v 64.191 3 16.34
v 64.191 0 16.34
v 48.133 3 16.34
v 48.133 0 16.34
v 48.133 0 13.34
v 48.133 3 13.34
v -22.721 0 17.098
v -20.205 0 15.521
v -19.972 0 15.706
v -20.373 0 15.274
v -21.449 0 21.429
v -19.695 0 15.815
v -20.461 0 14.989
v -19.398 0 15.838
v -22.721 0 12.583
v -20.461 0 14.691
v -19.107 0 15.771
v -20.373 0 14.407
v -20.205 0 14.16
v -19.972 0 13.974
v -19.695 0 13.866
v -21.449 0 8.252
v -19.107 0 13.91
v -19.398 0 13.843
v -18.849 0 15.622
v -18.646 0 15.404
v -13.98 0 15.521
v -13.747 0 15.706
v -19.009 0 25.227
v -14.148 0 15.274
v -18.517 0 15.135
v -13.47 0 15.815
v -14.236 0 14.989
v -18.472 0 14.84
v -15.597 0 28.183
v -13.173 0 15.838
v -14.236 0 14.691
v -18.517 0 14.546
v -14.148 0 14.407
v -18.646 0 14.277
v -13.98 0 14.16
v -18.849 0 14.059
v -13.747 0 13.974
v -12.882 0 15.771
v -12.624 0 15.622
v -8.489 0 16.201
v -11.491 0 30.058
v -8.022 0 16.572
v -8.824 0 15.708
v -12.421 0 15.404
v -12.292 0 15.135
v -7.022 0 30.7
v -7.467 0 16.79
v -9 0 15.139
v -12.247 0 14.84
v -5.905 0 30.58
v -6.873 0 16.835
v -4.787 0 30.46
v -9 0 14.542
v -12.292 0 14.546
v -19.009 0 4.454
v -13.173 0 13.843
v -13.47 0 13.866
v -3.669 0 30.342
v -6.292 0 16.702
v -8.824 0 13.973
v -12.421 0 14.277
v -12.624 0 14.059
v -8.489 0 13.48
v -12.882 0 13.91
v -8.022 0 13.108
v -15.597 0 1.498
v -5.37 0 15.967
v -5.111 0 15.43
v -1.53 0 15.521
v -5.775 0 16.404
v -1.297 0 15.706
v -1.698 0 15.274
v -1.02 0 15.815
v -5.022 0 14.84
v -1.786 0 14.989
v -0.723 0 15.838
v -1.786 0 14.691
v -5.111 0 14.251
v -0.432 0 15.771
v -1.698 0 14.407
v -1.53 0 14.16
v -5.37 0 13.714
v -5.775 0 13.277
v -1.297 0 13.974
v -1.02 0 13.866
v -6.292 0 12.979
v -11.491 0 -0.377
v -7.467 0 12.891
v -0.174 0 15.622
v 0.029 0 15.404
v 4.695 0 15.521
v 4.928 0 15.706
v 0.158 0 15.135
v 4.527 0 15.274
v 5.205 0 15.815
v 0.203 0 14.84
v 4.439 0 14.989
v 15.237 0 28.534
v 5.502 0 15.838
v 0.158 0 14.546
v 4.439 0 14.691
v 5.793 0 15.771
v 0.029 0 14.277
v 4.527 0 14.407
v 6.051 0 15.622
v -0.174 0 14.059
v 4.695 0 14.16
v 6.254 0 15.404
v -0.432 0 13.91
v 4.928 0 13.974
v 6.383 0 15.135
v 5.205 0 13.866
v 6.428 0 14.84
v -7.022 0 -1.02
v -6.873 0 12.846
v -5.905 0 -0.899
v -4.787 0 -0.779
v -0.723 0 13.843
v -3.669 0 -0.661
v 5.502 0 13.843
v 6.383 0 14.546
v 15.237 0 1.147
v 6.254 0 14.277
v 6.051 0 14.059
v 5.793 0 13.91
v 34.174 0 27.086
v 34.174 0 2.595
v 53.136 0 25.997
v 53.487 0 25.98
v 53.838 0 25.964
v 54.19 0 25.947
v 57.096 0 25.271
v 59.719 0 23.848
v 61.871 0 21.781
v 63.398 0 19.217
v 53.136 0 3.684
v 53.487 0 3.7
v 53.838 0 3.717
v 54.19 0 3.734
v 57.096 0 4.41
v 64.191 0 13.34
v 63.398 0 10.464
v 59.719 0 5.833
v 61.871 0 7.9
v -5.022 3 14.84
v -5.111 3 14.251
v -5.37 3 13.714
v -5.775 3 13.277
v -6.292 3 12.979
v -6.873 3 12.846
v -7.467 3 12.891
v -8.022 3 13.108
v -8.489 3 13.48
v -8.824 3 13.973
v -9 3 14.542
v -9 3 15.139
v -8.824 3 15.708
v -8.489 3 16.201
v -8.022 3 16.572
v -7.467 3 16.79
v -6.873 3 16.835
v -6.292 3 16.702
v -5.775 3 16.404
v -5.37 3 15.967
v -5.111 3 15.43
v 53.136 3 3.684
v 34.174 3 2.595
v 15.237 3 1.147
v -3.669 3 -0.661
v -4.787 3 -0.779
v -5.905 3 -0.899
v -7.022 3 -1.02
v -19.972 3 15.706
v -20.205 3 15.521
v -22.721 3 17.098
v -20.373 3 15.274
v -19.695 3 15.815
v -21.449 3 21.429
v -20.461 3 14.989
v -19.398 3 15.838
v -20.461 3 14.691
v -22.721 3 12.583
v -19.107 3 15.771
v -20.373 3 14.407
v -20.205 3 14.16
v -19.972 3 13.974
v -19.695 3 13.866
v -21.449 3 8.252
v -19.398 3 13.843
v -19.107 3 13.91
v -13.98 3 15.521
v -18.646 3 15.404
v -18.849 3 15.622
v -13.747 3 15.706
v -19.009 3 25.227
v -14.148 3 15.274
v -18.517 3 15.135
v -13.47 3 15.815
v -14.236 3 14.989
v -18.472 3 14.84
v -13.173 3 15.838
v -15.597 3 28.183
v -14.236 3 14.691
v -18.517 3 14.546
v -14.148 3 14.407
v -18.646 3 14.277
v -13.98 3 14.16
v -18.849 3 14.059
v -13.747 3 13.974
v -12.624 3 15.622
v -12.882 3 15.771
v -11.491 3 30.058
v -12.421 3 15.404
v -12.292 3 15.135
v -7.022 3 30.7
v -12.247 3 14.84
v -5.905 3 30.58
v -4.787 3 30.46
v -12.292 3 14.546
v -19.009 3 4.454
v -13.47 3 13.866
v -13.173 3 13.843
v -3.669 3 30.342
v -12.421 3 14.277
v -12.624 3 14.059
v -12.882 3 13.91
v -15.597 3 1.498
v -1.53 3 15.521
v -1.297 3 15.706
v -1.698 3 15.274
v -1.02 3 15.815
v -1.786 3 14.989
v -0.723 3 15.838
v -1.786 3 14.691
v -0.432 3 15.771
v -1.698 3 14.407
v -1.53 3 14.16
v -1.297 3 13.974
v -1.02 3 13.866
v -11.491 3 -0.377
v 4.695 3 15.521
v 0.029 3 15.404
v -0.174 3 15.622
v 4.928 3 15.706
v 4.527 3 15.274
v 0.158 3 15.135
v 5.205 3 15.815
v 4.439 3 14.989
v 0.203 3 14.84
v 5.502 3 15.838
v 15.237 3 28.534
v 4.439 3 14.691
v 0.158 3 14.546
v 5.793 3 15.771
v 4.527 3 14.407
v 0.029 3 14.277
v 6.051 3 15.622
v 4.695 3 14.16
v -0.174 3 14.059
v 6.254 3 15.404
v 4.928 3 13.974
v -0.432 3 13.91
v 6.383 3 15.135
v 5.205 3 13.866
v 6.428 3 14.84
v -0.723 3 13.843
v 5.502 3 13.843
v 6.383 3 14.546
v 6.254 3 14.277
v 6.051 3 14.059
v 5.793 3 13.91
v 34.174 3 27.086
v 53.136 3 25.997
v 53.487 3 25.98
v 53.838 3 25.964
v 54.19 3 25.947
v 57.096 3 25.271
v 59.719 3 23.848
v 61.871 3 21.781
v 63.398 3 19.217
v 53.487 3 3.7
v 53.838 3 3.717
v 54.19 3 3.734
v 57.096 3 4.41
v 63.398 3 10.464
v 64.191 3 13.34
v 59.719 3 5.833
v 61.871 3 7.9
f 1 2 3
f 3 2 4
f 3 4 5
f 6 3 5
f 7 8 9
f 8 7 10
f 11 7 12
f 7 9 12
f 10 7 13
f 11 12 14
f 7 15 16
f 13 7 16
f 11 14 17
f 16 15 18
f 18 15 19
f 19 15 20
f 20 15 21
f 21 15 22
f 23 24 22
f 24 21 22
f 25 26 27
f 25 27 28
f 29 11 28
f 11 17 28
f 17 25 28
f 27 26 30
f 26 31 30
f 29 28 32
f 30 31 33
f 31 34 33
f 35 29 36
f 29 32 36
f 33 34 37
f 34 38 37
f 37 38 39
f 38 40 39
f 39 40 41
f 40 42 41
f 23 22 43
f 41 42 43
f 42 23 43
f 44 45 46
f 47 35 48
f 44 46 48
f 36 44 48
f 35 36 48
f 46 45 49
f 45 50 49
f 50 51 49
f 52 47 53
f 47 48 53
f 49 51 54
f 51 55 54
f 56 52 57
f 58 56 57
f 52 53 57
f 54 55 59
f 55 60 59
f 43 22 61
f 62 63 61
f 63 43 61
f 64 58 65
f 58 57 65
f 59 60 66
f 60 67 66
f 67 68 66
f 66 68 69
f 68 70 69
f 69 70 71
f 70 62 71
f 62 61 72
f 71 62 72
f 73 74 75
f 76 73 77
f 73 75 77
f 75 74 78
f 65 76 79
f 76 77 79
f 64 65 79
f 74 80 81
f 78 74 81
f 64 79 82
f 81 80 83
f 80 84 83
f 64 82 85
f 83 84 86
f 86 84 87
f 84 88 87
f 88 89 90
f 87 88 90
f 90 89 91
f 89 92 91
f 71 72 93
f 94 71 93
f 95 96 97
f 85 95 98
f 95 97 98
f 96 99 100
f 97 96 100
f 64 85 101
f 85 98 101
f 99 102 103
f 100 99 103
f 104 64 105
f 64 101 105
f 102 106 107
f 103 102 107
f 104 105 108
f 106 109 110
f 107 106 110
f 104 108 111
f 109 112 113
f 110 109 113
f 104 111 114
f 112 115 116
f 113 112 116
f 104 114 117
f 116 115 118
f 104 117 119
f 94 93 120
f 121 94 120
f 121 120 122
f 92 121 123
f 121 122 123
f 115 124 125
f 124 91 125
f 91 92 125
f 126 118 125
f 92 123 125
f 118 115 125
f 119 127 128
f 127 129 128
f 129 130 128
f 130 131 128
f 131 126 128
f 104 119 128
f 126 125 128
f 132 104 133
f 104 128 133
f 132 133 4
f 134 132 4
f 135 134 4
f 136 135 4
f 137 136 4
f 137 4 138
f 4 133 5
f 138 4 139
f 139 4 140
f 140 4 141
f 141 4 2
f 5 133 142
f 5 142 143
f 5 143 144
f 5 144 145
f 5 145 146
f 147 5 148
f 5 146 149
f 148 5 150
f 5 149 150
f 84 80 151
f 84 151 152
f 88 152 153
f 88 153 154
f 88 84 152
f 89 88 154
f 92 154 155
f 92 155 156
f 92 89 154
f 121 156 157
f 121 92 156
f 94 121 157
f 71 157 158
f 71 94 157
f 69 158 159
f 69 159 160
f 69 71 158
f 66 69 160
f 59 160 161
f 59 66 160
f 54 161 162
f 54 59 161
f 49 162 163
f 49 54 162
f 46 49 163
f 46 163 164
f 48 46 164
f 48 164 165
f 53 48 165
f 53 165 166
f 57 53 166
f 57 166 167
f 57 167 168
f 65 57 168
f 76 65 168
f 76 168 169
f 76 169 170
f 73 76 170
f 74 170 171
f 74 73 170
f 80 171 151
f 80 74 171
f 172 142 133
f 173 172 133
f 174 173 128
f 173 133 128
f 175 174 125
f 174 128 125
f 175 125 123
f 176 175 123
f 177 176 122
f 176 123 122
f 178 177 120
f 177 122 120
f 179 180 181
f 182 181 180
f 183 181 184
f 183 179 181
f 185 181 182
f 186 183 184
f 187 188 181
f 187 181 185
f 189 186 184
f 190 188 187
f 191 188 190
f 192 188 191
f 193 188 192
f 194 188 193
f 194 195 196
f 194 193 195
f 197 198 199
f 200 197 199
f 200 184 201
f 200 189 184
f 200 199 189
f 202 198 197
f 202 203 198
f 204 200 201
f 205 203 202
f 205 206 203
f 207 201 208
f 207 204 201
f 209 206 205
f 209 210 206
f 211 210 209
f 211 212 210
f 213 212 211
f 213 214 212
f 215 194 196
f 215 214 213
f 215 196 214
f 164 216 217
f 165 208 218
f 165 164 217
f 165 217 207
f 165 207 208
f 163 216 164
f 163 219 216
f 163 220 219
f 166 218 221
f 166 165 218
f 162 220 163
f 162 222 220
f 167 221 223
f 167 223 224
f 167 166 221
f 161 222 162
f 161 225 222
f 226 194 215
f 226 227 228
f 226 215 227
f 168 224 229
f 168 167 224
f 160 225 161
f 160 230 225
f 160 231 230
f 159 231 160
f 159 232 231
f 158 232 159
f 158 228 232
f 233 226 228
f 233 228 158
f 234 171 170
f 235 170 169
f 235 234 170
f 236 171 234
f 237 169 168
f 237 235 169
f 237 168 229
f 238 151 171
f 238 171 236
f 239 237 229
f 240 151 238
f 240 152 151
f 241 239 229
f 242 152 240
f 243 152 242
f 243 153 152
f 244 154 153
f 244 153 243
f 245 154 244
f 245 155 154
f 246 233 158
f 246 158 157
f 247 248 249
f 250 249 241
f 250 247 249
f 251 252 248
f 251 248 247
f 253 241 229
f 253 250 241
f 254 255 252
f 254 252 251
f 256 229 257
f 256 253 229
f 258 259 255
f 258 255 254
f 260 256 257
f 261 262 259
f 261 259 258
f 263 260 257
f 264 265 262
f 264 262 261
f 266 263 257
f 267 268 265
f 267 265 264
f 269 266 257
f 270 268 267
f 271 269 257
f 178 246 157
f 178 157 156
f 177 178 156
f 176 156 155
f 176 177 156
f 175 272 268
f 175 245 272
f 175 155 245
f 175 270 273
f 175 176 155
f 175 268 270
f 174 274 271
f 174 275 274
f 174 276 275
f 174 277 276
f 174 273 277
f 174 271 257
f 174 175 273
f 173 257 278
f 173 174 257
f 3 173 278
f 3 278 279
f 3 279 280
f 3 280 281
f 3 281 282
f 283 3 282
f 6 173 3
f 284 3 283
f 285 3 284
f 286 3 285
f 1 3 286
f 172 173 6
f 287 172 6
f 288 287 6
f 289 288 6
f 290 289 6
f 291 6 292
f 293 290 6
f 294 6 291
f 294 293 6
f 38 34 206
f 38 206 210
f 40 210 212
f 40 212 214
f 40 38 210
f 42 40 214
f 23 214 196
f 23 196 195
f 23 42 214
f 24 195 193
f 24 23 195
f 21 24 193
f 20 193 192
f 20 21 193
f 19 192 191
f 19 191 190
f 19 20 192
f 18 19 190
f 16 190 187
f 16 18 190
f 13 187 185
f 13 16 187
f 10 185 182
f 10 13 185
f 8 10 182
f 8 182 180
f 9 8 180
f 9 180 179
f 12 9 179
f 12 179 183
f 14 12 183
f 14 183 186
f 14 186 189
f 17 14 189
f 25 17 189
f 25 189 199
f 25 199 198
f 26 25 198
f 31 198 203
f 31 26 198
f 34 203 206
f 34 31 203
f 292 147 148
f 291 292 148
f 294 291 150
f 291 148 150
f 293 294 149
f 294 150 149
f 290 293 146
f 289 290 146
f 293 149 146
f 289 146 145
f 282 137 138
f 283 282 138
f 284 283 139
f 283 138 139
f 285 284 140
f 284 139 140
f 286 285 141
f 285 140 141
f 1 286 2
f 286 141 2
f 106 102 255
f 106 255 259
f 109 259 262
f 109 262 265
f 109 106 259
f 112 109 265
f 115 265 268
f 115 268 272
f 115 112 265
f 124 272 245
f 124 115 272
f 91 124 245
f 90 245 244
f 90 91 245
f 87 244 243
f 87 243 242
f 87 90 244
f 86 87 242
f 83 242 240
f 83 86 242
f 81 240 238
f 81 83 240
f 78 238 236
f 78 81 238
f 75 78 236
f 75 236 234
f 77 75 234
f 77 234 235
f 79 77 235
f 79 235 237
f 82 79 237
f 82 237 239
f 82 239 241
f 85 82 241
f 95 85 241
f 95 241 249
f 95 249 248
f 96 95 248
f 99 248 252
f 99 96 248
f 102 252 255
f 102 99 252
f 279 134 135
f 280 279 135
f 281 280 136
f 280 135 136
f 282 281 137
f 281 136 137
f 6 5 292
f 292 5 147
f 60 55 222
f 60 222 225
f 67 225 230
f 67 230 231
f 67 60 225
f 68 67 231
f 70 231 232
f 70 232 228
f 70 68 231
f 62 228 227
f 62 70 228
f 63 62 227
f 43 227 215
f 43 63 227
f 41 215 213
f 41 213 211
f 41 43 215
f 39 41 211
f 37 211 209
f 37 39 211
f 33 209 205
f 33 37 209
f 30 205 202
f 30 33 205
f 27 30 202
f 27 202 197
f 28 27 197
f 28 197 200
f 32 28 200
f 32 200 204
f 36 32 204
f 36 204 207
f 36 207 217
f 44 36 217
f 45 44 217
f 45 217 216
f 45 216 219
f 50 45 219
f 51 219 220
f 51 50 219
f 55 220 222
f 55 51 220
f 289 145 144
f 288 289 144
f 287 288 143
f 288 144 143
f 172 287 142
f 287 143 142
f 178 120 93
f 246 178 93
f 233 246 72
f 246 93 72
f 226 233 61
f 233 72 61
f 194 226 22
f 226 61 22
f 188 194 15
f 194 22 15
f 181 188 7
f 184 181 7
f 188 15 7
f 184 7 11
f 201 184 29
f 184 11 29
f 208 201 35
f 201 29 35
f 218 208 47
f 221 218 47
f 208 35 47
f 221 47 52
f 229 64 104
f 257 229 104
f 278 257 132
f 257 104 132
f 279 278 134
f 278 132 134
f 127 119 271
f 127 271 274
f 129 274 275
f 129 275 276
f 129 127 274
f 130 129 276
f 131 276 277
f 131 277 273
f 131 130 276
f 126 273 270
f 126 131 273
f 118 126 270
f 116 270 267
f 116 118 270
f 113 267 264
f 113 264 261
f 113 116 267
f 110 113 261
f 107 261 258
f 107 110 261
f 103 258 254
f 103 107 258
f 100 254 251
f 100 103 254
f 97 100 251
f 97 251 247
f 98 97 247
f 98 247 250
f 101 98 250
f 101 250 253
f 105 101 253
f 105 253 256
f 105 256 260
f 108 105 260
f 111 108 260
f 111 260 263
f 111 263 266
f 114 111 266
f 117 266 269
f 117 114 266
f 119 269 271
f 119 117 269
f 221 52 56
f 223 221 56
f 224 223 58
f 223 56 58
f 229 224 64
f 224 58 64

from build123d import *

# Parameters (mm, degrees)
SKETCH1_R           = 1
SKETCH1_R_2         = 2
BOSS_EXTRUDE1_DEPTH = 3


with BuildPart() as part:
    # Sketch1 → Boss-Extrude1 (new body)
    with BuildSketch(Plane(origin=(0, 0, 0), x_dir=(1, 0, 0), z_dir=(0, 1, 0))):
        with BuildLine():
            Line((64.190973866, -16.340444348), (48.133067619, -16.340444348))
            Line((48.133067619, -16.340444348), (48.133067619, -13.340444349))
            Line((48.133067619, -13.340444349), (64.190973866, -13.340444349))
            ThreePointArc((64.190973866, -13.340444349), (60.864318365, -6.794408764), (54.189826358, -3.733628612))
            ThreePointArc((54.189826358, -3.733628612), (53.662670154, -3.708804342), (53.135527124, -3.683701873))
            ThreePointArc((53.135527124, -3.683701873), (24.702146142, -1.915932839), (-3.669341235, 0.661054823))
            ThreePointArc((-3.669341235, 0.661054823), (-5.346030709, 0.838891836), (-7.022417949, 1.019555652))
            ThreePointArc((-7.022417949, 1.019555652), (-22.882417949, -14.840444348), (-7.022417949, -30.700444348))
            ThreePointArc((-7.022417949, -30.700444348), (-5.346030709, -30.519780533), (-3.669341235, -30.341943519))
            ThreePointArc((-3.669341235, -30.341943519), (24.702146142, -27.764955858), (53.135527124, -25.997186824))
            ThreePointArc((53.135527124, -25.997186824), (53.662670154, -25.972084355), (54.189826358, -25.947260084))
            ThreePointArc((54.189826358, -25.947260084), (60.864318365, -22.886479933), (64.190973866, -16.340444348))
        make_face()
        with Locations((-19.472417949, -14.840444348)):
            Circle(SKETCH1_R, mode=Mode.SUBTRACT)
        with Locations((-13.247417949, -14.840444348)):
            Circle(SKETCH1_R, mode=Mode.SUBTRACT)
        with Locations((-7.022417949, -14.840444348)):
            Circle(SKETCH1_R_2, mode=Mode.SUBTRACT)
        with Locations((-0.797417949, -14.840444348)):
            Circle(SKETCH1_R, mode=Mode.SUBTRACT)
        with Locations((5.427582051, -14.840444348)):
            Circle(SKETCH1_R, mode=Mode.SUBTRACT)
    extrude(amount=BOSS_EXTRUDE1_DEPTH)


solid = part.part
